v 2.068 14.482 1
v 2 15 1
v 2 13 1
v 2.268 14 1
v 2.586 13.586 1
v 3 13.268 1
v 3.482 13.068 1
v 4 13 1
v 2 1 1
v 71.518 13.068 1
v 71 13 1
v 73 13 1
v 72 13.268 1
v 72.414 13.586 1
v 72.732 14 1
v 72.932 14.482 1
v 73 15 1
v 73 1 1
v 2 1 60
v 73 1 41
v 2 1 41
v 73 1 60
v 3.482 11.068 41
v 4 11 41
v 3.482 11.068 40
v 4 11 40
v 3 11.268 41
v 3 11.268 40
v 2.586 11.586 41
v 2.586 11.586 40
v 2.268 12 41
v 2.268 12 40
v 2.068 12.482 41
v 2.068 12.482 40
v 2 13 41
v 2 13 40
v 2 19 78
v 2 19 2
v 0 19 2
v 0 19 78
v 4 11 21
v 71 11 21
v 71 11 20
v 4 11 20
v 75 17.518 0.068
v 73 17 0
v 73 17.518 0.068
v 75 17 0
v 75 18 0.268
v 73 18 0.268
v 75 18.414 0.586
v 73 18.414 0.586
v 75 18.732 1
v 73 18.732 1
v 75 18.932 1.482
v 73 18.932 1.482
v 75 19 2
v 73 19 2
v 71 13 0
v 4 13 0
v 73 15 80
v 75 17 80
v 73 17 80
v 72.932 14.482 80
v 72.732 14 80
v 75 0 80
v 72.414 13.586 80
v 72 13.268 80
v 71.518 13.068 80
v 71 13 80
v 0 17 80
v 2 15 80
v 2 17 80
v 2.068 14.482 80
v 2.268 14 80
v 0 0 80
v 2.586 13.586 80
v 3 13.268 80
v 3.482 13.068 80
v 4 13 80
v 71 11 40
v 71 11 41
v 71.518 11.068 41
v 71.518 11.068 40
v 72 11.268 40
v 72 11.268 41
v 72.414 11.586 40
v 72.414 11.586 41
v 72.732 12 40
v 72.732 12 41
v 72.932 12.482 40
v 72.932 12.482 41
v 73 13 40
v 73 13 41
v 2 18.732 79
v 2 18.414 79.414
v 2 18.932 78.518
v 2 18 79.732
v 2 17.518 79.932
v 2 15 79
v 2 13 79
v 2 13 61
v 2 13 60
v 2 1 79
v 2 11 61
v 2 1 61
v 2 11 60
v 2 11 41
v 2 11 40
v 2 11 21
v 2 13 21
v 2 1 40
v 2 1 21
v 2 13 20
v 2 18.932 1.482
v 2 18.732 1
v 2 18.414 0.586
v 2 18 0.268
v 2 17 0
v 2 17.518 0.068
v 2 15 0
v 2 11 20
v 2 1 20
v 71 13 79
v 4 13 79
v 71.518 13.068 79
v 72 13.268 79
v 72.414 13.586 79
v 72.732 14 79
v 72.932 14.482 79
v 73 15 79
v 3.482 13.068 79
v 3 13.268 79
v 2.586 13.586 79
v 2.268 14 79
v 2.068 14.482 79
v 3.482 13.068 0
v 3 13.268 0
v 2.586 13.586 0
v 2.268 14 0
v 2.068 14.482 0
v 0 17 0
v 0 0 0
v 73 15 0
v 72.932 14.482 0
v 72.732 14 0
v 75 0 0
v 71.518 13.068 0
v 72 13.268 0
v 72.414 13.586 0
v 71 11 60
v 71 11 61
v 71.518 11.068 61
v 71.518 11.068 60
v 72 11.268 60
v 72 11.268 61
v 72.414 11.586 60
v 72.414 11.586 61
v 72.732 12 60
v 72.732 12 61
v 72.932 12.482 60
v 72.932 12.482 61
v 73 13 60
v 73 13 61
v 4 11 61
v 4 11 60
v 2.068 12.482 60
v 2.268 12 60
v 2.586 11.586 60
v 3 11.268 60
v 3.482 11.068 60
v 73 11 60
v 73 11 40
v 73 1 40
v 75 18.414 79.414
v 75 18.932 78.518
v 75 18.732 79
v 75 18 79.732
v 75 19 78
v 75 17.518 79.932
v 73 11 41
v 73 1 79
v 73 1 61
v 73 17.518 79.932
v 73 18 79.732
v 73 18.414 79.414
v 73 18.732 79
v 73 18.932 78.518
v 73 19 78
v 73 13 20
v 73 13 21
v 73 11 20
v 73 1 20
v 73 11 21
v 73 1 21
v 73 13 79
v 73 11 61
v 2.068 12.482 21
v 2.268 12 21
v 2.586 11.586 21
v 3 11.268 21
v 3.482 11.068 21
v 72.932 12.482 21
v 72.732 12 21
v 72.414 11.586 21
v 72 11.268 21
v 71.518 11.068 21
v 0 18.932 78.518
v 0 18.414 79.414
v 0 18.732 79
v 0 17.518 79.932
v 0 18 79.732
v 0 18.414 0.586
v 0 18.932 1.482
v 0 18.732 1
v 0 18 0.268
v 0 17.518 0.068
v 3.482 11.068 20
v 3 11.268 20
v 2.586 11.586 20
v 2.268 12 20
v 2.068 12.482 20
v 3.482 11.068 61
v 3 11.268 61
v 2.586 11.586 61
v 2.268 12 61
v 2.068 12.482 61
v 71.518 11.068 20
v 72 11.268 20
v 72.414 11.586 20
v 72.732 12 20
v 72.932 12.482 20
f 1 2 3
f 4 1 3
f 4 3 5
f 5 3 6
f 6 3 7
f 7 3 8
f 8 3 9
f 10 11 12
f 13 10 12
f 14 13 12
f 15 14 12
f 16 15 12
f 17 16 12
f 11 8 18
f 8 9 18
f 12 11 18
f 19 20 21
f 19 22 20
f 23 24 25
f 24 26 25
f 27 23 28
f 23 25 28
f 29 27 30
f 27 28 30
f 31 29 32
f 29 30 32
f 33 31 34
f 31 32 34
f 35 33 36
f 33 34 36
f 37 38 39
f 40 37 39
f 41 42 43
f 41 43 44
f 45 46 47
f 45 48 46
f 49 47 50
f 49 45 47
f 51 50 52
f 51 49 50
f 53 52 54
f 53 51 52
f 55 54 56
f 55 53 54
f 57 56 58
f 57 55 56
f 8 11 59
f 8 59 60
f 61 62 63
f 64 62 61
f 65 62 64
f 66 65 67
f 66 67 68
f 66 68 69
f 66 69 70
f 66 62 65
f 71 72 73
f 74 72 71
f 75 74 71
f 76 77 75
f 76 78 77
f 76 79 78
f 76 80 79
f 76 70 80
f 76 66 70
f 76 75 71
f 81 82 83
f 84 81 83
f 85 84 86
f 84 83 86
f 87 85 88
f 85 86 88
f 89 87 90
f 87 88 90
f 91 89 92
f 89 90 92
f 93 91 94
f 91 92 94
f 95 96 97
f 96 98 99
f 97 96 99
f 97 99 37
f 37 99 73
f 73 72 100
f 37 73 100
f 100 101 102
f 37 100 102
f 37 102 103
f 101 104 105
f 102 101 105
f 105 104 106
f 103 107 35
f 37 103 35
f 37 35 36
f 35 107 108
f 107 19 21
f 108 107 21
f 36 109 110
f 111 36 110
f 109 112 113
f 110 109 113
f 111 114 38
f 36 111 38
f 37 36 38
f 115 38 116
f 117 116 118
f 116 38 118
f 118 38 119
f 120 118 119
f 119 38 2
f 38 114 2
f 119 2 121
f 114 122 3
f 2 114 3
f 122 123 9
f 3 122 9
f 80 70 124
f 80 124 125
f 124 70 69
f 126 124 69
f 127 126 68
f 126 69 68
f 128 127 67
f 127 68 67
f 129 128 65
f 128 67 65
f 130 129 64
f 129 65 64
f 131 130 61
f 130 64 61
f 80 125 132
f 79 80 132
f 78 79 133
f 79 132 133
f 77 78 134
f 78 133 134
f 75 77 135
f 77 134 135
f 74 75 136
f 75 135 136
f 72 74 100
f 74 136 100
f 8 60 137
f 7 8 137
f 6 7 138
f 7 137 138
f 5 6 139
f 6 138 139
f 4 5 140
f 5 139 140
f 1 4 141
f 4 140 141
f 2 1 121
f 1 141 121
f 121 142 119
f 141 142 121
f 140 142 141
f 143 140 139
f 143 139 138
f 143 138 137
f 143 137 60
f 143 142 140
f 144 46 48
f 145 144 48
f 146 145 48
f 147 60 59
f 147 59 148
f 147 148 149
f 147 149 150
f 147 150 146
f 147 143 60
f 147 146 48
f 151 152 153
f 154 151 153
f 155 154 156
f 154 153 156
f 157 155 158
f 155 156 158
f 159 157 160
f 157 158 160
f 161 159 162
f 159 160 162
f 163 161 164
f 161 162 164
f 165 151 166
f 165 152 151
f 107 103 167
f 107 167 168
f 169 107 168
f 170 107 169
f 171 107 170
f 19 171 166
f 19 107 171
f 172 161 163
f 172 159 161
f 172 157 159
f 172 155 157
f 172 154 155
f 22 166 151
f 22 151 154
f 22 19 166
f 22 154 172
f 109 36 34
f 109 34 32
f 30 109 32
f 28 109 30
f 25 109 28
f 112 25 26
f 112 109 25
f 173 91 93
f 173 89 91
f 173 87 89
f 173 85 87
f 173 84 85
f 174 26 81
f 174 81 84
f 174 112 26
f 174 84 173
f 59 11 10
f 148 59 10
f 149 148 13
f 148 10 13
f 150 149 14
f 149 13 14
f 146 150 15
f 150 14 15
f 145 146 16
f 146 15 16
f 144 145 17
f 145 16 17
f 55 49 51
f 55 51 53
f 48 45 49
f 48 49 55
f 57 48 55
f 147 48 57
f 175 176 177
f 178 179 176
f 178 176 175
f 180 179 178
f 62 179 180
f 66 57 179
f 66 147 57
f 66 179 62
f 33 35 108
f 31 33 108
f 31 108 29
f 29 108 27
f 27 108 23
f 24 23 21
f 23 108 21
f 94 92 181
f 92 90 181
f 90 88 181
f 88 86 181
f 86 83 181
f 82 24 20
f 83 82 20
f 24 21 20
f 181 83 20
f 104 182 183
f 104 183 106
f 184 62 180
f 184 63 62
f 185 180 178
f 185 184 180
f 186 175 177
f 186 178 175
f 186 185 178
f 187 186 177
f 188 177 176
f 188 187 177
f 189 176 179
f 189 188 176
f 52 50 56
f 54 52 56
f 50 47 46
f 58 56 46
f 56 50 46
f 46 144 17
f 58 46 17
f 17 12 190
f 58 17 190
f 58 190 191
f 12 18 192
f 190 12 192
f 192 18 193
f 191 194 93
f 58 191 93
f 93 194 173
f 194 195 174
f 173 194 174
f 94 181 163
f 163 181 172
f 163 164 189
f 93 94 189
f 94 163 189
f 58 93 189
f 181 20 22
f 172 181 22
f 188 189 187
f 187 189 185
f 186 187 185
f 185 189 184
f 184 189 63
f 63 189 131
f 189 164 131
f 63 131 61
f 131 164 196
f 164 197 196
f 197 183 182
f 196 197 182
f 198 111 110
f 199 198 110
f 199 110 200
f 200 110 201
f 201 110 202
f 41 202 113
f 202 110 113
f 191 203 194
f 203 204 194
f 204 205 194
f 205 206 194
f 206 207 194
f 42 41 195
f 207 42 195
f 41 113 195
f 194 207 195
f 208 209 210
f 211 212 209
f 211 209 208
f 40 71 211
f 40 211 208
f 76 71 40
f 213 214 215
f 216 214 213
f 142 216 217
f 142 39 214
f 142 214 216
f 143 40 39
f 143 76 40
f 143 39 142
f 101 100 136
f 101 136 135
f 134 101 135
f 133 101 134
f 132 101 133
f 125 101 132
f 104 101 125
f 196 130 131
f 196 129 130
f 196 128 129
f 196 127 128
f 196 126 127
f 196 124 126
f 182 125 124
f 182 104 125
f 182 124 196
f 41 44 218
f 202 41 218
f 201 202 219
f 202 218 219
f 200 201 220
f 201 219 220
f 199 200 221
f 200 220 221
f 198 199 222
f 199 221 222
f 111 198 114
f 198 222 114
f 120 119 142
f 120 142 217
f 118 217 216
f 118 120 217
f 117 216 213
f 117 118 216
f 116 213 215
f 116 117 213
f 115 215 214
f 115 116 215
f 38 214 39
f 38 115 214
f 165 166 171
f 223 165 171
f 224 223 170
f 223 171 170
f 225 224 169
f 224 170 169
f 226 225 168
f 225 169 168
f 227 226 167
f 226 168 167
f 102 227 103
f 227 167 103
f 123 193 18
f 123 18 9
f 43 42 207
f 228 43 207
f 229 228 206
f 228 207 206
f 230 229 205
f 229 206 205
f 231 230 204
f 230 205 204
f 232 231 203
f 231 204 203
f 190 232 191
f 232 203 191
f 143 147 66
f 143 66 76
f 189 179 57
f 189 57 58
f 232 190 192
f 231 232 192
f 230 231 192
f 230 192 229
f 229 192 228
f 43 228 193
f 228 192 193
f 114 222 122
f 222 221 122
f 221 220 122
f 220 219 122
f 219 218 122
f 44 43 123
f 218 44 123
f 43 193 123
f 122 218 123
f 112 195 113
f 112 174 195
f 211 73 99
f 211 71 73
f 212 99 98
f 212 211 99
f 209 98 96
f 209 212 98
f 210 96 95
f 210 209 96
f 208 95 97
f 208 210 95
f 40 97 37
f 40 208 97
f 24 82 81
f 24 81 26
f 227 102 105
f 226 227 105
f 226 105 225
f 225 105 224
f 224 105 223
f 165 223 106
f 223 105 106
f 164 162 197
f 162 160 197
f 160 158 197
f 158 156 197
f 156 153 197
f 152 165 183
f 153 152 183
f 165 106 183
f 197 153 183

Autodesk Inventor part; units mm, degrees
ref_plane "YZ Plane" through (0, 0, 0) normal (1, 0, 0) x (0, 1, 0)
ref_plane "XZ Plane" through (0, 0, 0) normal (0, 1, 0) x (-1, 0, 0)
ref_plane "XY Plane" through (0, 0, 0) normal (0, 0, 1) x (1, 0, 0)
sketch "Эскиз1" plane through (0, 0, 0) normal (0, 1, 0) x (-1, 0, 0)
  line L0 (0, 0) -> (-75, 0)
  line L1 (-75, 0) -> (-75, 80)
  line L2 (-75, 80) -> (0, 80)
  line L3 (0, 80) -> (0, 0)
  line L4 (0, 60) -> (-75, 60)
  line L5 (0, 61) -> (-75, 61)
  line L6 (0, 79) -> (-75, 79)
  line L7 (0, 40) -> (-75, 40)
  line L8 (-75, 20) -> (0, 20)
  line L9 (0, 1) -> (-75, 1)
  line L10 (0, 21) -> (-75, 21)
  line L11 (0, 41) -> (-75, 41)
  line L12 (-2, 80) -> (-2, 0)
  line L13 (-73, 0) -> (-73, 80)
  point P0 (-73, 20)
  point P1 (-73, 1)
  point P2 (-2, 1)
  point P3 (-2, 20)
  point P4 (-73, 40)
  point P5 (-73, 21)
  point P6 (-2, 21)
  point P7 (-2, 40)
  point P8 (-73, 60)
  point P9 (-73, 41)
  point P10 (-2, 41)
  point P11 (-2, 60)
  point P12 (-73, 79)
  point P13 (-73, 61)
  point P14 (-2, 61)
  point P15 (-2, 79)
  dimension "d0" = 75
  dimension "d1" = 80
  dimension "d2" = 20
  dimension "d3" = 1
  dimension "d4" = 1
  dimension "d5" = 20
  dimension "d6" = 20
  dimension "d7" = 19
  dimension "d8" = 1
  dimension "d9" = 1
  dimension "d10" = 2
  dimension "d11" = 2
extrude "Выдавливание1" add sketch "Эскиз1" along normal blind 1 contours L9 L13 L8 L12 | L10 L13 L7 L12 | L11 L13 L4 L12 | L5 L13 L6 L12
extrude "Выдавливание2" add sketch "Эскиз1" along normal blind 19 contours L0 L12 L9 L3 | L9 L12 L8 L3 | L0 L1 L9 L13 | L8 L12 L10 L3 | L9 L1 L8 L13 | L10 L12 L7 L3 | L8 L1 L10 L13 | L7 L12 L11 L3 | L10 L1 L7 L13 | L11 L12 L4 L3 | L7 L1 L11 L13 | L4 L12 L5 L3 | L11 L1 L4 L13 | L5 L12 L6 L3 | L4 L1 L5 L13 | L6 L12 L2 L3 | L5 L1 L6 L13 | L6 L1 L2 L13
extrude "Выдавливание3" add sketch "Эскиз1" along normal blind 13 contours L0 L13 L9 L12 | L6 L13 L2 L12
extrude "Выдавливание4" add sketch "Эскиз1" along normal blind 11 contours L8 L13 L10 L12 | L7 L13 L11 L12 | L4 L13 L5 L12
fillet "Сопряжение1" radius 2 4 edges at (1, 19, 80) (1, 19, 0) (74, 19, 0) (74, 19, 80)
fillet "Сопряжение2" radius 2 10 edges at (2, 13, 79.5) (2, 11, 20.5) (2, 11, 40.5) (2, 11, 60.5) (2, 13, 0.5) (73, 13, 0.5) (73, 11, 20.5) (73, 11, 40.5) (73, 11, 60.5) (73, 13, 79.5)
properties part number "BatteryCompartment"
